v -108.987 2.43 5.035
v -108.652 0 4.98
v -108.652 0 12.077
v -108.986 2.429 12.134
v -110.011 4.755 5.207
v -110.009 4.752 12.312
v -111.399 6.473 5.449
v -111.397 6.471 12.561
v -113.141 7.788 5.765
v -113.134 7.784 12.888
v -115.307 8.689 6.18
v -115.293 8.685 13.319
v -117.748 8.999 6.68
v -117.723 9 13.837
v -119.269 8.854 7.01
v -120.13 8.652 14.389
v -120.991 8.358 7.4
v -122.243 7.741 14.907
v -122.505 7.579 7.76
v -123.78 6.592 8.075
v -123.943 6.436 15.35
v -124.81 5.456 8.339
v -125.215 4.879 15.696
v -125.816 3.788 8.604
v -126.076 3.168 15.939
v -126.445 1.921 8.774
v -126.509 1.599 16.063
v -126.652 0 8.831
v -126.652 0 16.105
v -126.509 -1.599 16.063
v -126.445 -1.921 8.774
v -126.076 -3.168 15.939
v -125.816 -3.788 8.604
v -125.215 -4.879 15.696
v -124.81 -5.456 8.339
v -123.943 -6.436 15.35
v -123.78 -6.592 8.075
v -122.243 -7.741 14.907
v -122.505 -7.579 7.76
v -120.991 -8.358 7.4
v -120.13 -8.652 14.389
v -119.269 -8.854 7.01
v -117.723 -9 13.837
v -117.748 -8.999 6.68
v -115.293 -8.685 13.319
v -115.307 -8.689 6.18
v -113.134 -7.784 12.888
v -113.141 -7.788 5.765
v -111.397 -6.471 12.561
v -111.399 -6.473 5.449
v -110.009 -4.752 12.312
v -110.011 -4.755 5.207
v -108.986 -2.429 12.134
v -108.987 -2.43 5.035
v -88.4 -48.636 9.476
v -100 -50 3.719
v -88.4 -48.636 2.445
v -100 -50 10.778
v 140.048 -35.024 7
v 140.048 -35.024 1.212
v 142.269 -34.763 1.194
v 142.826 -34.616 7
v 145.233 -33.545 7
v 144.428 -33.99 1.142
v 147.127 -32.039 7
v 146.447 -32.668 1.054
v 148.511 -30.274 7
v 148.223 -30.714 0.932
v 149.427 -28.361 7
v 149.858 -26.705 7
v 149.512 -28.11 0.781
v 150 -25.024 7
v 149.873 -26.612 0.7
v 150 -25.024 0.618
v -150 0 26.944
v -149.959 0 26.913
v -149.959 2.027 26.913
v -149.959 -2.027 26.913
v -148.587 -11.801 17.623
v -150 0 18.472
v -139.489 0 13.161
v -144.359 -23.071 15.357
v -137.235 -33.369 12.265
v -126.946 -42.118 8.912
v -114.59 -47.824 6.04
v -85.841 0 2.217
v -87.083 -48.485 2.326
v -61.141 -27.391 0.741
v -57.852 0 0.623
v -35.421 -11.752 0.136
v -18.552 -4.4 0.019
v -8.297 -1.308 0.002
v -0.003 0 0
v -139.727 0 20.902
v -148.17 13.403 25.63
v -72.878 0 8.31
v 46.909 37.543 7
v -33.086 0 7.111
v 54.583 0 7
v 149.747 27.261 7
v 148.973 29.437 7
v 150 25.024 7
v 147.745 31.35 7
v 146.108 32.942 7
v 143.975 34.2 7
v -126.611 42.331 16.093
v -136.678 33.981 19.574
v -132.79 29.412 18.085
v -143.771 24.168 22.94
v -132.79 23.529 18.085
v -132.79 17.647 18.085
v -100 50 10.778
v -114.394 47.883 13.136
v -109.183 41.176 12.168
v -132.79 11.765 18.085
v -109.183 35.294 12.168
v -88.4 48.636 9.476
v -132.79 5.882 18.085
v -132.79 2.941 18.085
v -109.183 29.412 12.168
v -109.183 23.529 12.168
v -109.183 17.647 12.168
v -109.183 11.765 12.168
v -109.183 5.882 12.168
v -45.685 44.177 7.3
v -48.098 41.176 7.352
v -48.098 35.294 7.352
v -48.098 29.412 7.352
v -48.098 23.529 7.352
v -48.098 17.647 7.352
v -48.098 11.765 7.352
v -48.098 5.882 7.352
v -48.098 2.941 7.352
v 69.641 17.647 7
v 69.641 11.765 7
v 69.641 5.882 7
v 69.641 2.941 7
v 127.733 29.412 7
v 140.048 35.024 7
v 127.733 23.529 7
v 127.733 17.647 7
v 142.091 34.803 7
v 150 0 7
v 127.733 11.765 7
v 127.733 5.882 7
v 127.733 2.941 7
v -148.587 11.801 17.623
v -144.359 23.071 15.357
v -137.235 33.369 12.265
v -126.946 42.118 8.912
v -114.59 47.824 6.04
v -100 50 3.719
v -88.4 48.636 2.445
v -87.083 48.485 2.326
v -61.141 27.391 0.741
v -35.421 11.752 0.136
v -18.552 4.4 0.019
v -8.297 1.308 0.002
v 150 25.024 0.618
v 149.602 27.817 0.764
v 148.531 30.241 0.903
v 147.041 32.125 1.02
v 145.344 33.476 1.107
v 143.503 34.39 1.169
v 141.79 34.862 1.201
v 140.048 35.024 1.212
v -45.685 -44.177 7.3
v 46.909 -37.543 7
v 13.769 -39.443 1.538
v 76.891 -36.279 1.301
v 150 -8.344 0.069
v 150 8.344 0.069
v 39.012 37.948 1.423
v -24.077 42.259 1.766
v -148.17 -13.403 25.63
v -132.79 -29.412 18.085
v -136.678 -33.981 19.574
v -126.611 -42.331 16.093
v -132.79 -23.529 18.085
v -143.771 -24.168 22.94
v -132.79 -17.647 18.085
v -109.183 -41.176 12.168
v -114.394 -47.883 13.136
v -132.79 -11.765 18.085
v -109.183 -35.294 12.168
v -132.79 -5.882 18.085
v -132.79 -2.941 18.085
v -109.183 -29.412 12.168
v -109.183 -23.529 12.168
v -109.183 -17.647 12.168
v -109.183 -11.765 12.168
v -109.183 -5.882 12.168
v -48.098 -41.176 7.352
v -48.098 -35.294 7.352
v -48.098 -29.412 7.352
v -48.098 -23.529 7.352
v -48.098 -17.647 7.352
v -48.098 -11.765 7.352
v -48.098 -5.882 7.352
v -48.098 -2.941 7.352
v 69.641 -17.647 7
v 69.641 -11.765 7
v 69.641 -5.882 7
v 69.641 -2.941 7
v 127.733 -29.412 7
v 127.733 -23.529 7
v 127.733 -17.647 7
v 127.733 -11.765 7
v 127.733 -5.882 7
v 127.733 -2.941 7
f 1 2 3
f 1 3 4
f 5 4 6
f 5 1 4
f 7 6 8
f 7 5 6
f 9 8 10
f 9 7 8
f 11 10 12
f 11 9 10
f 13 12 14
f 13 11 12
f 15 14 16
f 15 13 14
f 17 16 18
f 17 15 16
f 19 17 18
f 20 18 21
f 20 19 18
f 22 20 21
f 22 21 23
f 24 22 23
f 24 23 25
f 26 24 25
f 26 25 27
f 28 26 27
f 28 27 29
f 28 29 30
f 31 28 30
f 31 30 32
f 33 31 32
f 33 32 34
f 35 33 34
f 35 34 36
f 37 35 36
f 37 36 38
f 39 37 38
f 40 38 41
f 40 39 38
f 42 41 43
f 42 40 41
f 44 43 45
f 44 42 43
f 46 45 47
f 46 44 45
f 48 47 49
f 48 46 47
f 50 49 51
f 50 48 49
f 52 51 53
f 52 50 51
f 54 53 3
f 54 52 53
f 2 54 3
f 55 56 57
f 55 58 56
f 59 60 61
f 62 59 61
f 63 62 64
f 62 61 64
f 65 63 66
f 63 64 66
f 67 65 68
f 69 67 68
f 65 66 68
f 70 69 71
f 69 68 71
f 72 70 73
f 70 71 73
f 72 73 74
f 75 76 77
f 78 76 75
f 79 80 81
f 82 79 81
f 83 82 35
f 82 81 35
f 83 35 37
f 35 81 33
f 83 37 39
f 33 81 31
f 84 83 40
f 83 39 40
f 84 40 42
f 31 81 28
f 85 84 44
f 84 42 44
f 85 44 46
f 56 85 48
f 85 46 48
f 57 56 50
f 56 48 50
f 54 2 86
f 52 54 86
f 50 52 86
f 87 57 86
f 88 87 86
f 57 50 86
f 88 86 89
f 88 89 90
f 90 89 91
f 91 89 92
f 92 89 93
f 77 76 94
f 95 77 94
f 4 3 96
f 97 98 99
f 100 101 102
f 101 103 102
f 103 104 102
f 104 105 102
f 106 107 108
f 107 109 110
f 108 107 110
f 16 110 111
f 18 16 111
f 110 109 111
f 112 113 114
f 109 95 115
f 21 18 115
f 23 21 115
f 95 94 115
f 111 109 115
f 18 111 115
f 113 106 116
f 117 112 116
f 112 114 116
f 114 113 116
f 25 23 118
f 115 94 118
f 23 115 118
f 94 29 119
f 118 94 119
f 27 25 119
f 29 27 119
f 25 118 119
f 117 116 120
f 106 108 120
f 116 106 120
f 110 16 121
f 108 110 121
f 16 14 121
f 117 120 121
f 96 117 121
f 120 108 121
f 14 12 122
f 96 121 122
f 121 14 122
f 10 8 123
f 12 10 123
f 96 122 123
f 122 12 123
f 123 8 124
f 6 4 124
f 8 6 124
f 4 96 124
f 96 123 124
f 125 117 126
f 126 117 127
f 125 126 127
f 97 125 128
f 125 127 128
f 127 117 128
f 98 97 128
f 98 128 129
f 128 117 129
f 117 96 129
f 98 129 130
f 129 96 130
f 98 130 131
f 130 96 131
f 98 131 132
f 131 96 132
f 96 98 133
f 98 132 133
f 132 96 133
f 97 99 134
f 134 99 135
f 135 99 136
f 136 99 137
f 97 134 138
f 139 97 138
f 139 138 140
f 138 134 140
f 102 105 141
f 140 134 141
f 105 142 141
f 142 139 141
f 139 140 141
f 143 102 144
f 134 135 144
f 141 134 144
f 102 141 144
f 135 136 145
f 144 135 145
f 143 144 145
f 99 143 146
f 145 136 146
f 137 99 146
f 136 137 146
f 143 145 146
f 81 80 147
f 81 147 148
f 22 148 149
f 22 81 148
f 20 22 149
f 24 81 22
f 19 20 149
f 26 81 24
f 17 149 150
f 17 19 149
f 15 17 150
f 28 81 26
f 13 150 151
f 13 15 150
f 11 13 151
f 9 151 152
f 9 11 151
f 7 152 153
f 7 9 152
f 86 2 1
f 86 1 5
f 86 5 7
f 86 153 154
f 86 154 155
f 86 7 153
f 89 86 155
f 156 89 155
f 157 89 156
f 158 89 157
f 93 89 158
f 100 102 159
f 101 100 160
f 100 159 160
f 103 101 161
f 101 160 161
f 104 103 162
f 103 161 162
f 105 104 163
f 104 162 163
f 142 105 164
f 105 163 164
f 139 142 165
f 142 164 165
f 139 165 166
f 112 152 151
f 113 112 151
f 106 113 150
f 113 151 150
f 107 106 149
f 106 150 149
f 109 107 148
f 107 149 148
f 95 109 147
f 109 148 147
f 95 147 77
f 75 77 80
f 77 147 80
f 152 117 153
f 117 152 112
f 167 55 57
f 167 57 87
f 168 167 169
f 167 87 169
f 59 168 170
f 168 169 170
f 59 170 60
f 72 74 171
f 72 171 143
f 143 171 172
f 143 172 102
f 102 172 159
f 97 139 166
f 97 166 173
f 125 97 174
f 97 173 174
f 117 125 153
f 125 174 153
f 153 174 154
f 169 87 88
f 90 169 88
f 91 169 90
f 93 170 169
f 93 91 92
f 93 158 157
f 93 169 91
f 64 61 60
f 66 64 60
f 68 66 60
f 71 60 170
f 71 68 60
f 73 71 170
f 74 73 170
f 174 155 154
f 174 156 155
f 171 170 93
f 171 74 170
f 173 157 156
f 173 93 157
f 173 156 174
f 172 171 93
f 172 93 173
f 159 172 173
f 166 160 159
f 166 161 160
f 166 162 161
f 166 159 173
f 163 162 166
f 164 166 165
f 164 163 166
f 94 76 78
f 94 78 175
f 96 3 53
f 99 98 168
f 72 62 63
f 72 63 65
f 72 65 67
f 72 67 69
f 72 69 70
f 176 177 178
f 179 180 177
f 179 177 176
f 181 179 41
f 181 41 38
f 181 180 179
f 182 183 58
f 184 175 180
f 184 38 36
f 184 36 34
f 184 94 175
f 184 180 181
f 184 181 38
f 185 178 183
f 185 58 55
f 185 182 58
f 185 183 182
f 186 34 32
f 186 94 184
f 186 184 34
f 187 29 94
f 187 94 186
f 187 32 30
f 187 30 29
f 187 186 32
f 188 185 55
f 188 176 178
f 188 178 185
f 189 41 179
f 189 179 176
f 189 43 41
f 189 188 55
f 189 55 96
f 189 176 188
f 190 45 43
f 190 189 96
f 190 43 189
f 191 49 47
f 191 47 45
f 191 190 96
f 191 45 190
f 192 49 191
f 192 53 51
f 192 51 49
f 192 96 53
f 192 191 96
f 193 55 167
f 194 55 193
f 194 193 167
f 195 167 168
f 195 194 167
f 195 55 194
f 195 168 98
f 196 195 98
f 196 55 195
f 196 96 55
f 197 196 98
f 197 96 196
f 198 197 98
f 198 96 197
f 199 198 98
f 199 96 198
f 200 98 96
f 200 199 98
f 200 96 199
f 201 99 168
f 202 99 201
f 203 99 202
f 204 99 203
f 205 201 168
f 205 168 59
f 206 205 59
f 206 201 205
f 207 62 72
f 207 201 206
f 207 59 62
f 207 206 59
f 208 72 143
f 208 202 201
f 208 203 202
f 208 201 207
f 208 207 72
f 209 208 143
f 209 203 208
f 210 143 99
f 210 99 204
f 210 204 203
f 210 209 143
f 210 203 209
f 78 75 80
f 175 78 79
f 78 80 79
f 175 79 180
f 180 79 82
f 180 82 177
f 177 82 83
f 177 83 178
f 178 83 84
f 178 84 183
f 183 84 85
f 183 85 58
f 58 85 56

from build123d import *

# Parameters (mm, degrees)
F2_DEPTH = 50
F0_R     = 9
F3_DEPTH = 41
F5_DEPTH = 150


# Not quite as in the source:
# - the dataset's text gives a spline's control points without its knots; the knots are read off the source's solid


with BuildPart() as f2:
    # F1 (on Front) → F2 (new body, symmetric)
    with BuildSketch(Plane.XZ):
        with BuildLine():
            ThreePointArc((-149.9588993892, 26.9134754342), (-154.8613095864, 26.2305586605), (-154.1783928127, 21.3281484633))
            add(Edge.make_bspline(
                [(-154.1783928127, 21.3281484633), (-125.9464059615, 0), (-3.9595449586, 0), (130.4603123693, 0), (151.5675187111, 0)],
                knots=[0, 0, 0, 0, 0.5033195654, 1, 1, 1, 1], degree=3))
            ThreePointArc((151.5675187111, 0), (155.0675187869, 3.5000000758), (151.5675187111, 7.0000001516))
            add(Edge.make_bspline(
                [(-149.9588993892, 26.9134754342), (-148.4478574546, 25.7719430693), (-145.1555512603, 23.5934371829), (-137.5039021405, 19.6641031988), (-126.0184700843, 15.5798750303), (-109.5578013858, 11.9753296087), (-90.8479253185, 9.5246754809), (-70.2937339258, 8.030291433), (-48.2800158692, 7.2686571064), (-29.0264464578, 7.0487772943), (-13.2581336189, 7.0012099028), (-1.291744917, 6.9996863373), (10.7653391732, 7.0000823662), (26.8484793874, 6.9999526881), (46.7909432723, 7.0000162503), (69.87873725, 6.9999959326), (98.7623960141, 7.0000025942), (129.847702251, 6.9999992634), (146.255449604, 7.0000001516), (151.5675187111, 7.0000001516)],
                knots=[0, 0, 0, 0, 0.03125, 0.0625, 0.125, 0.1875, 0.25, 0.3125, 0.375, 0.4375, 0.46875, 0.5, 0.53125, 0.5625, 0.625, 0.6875, 0.75, 0.875, 1, 1, 1, 1], degree=3))
        make_face()
    extrude(amount=F2_DEPTH, both=True)

    # F0 (on Top) → F3 (intersect)
    with BuildSketch(Plane.XY):
        with BuildLine():
            ThreePointArc((-150, 0), (-135.3553390593, -35.3553390593), (-100, -50))
            ThreePointArc((-100, -50), (-94.2011170994, -49.3098342645), (-88.4003291499, -48.635867795))
            ThreePointArc((-88.4003291499, -48.635867795), (-60.7572711034, -30.9839995602), (-50, 0))
            ThreePointArc((-50, 0), (-60.7572711034, 30.9839995602), (-88.4003291499, 48.635867795))
            ThreePointArc((-88.4003291499, 48.635867795), (-94.2011170994, 49.3098342645), (-100, 50))
            ThreePointArc((-100, 50), (-135.3553390593, 35.3553390593), (-150, 0))
        make_face()
        with Locations((-117.6522374153, 0)):
            Circle(F0_R, mode=Mode.SUBTRACT)
        with BuildLine():
            ThreePointArc((140.0476001587, -35.0236869248), (147.0878770301, -32.0780187539), (150, -25.0238002141))
            Line((150, -25.0238002141), (150, 0))
            Line((150, 0), (150, 25.0238002141))
            ThreePointArc((150, 25.0238002141), (147.0878770301, 32.0780187539), (140.0476001587, 35.0236869248))
            ThreePointArc((140.0476001587, 35.0236869248), (25.6372549098, 38.7018244409), (-88.4003291499, 48.635867795))
            ThreePointArc((-88.4003291499, 48.635867795), (-60.7572711034, 30.9839995602), (-50, 0))
            ThreePointArc((-50, 0), (-60.7572711034, -30.9839995602), (-88.4003291499, -48.635867795))
            ThreePointArc((-88.4003291499, -48.635867795), (25.6372549098, -38.7018244409), (140.0476001587, -35.0236869248))
        make_face()
    extrude(amount=F3_DEPTH, mode=Mode.INTERSECT)

    # F4 (on Right) → F5 (intersect, symmetric)
    with BuildSketch(Plane.YZ):
        with BuildLine():
            Line((-52.1002963765, 32.8564588929), (-55.3800071338, 3.0362728213))
            ThreePointArc((-55.3800071338, 3.0362728213), (0, 0), (55.3800071338, 3.0362728213))
            Line((55.3800071338, 3.0362728213), (52.1002963765, 32.8564588929))
            ThreePointArc((52.1002963765, 32.8564588929), (0, 30), (-52.1002963765, 32.8564588929))
        make_face()
    extrude(amount=F5_DEPTH, both=True, mode=Mode.INTERSECT)


solid = f2.part
